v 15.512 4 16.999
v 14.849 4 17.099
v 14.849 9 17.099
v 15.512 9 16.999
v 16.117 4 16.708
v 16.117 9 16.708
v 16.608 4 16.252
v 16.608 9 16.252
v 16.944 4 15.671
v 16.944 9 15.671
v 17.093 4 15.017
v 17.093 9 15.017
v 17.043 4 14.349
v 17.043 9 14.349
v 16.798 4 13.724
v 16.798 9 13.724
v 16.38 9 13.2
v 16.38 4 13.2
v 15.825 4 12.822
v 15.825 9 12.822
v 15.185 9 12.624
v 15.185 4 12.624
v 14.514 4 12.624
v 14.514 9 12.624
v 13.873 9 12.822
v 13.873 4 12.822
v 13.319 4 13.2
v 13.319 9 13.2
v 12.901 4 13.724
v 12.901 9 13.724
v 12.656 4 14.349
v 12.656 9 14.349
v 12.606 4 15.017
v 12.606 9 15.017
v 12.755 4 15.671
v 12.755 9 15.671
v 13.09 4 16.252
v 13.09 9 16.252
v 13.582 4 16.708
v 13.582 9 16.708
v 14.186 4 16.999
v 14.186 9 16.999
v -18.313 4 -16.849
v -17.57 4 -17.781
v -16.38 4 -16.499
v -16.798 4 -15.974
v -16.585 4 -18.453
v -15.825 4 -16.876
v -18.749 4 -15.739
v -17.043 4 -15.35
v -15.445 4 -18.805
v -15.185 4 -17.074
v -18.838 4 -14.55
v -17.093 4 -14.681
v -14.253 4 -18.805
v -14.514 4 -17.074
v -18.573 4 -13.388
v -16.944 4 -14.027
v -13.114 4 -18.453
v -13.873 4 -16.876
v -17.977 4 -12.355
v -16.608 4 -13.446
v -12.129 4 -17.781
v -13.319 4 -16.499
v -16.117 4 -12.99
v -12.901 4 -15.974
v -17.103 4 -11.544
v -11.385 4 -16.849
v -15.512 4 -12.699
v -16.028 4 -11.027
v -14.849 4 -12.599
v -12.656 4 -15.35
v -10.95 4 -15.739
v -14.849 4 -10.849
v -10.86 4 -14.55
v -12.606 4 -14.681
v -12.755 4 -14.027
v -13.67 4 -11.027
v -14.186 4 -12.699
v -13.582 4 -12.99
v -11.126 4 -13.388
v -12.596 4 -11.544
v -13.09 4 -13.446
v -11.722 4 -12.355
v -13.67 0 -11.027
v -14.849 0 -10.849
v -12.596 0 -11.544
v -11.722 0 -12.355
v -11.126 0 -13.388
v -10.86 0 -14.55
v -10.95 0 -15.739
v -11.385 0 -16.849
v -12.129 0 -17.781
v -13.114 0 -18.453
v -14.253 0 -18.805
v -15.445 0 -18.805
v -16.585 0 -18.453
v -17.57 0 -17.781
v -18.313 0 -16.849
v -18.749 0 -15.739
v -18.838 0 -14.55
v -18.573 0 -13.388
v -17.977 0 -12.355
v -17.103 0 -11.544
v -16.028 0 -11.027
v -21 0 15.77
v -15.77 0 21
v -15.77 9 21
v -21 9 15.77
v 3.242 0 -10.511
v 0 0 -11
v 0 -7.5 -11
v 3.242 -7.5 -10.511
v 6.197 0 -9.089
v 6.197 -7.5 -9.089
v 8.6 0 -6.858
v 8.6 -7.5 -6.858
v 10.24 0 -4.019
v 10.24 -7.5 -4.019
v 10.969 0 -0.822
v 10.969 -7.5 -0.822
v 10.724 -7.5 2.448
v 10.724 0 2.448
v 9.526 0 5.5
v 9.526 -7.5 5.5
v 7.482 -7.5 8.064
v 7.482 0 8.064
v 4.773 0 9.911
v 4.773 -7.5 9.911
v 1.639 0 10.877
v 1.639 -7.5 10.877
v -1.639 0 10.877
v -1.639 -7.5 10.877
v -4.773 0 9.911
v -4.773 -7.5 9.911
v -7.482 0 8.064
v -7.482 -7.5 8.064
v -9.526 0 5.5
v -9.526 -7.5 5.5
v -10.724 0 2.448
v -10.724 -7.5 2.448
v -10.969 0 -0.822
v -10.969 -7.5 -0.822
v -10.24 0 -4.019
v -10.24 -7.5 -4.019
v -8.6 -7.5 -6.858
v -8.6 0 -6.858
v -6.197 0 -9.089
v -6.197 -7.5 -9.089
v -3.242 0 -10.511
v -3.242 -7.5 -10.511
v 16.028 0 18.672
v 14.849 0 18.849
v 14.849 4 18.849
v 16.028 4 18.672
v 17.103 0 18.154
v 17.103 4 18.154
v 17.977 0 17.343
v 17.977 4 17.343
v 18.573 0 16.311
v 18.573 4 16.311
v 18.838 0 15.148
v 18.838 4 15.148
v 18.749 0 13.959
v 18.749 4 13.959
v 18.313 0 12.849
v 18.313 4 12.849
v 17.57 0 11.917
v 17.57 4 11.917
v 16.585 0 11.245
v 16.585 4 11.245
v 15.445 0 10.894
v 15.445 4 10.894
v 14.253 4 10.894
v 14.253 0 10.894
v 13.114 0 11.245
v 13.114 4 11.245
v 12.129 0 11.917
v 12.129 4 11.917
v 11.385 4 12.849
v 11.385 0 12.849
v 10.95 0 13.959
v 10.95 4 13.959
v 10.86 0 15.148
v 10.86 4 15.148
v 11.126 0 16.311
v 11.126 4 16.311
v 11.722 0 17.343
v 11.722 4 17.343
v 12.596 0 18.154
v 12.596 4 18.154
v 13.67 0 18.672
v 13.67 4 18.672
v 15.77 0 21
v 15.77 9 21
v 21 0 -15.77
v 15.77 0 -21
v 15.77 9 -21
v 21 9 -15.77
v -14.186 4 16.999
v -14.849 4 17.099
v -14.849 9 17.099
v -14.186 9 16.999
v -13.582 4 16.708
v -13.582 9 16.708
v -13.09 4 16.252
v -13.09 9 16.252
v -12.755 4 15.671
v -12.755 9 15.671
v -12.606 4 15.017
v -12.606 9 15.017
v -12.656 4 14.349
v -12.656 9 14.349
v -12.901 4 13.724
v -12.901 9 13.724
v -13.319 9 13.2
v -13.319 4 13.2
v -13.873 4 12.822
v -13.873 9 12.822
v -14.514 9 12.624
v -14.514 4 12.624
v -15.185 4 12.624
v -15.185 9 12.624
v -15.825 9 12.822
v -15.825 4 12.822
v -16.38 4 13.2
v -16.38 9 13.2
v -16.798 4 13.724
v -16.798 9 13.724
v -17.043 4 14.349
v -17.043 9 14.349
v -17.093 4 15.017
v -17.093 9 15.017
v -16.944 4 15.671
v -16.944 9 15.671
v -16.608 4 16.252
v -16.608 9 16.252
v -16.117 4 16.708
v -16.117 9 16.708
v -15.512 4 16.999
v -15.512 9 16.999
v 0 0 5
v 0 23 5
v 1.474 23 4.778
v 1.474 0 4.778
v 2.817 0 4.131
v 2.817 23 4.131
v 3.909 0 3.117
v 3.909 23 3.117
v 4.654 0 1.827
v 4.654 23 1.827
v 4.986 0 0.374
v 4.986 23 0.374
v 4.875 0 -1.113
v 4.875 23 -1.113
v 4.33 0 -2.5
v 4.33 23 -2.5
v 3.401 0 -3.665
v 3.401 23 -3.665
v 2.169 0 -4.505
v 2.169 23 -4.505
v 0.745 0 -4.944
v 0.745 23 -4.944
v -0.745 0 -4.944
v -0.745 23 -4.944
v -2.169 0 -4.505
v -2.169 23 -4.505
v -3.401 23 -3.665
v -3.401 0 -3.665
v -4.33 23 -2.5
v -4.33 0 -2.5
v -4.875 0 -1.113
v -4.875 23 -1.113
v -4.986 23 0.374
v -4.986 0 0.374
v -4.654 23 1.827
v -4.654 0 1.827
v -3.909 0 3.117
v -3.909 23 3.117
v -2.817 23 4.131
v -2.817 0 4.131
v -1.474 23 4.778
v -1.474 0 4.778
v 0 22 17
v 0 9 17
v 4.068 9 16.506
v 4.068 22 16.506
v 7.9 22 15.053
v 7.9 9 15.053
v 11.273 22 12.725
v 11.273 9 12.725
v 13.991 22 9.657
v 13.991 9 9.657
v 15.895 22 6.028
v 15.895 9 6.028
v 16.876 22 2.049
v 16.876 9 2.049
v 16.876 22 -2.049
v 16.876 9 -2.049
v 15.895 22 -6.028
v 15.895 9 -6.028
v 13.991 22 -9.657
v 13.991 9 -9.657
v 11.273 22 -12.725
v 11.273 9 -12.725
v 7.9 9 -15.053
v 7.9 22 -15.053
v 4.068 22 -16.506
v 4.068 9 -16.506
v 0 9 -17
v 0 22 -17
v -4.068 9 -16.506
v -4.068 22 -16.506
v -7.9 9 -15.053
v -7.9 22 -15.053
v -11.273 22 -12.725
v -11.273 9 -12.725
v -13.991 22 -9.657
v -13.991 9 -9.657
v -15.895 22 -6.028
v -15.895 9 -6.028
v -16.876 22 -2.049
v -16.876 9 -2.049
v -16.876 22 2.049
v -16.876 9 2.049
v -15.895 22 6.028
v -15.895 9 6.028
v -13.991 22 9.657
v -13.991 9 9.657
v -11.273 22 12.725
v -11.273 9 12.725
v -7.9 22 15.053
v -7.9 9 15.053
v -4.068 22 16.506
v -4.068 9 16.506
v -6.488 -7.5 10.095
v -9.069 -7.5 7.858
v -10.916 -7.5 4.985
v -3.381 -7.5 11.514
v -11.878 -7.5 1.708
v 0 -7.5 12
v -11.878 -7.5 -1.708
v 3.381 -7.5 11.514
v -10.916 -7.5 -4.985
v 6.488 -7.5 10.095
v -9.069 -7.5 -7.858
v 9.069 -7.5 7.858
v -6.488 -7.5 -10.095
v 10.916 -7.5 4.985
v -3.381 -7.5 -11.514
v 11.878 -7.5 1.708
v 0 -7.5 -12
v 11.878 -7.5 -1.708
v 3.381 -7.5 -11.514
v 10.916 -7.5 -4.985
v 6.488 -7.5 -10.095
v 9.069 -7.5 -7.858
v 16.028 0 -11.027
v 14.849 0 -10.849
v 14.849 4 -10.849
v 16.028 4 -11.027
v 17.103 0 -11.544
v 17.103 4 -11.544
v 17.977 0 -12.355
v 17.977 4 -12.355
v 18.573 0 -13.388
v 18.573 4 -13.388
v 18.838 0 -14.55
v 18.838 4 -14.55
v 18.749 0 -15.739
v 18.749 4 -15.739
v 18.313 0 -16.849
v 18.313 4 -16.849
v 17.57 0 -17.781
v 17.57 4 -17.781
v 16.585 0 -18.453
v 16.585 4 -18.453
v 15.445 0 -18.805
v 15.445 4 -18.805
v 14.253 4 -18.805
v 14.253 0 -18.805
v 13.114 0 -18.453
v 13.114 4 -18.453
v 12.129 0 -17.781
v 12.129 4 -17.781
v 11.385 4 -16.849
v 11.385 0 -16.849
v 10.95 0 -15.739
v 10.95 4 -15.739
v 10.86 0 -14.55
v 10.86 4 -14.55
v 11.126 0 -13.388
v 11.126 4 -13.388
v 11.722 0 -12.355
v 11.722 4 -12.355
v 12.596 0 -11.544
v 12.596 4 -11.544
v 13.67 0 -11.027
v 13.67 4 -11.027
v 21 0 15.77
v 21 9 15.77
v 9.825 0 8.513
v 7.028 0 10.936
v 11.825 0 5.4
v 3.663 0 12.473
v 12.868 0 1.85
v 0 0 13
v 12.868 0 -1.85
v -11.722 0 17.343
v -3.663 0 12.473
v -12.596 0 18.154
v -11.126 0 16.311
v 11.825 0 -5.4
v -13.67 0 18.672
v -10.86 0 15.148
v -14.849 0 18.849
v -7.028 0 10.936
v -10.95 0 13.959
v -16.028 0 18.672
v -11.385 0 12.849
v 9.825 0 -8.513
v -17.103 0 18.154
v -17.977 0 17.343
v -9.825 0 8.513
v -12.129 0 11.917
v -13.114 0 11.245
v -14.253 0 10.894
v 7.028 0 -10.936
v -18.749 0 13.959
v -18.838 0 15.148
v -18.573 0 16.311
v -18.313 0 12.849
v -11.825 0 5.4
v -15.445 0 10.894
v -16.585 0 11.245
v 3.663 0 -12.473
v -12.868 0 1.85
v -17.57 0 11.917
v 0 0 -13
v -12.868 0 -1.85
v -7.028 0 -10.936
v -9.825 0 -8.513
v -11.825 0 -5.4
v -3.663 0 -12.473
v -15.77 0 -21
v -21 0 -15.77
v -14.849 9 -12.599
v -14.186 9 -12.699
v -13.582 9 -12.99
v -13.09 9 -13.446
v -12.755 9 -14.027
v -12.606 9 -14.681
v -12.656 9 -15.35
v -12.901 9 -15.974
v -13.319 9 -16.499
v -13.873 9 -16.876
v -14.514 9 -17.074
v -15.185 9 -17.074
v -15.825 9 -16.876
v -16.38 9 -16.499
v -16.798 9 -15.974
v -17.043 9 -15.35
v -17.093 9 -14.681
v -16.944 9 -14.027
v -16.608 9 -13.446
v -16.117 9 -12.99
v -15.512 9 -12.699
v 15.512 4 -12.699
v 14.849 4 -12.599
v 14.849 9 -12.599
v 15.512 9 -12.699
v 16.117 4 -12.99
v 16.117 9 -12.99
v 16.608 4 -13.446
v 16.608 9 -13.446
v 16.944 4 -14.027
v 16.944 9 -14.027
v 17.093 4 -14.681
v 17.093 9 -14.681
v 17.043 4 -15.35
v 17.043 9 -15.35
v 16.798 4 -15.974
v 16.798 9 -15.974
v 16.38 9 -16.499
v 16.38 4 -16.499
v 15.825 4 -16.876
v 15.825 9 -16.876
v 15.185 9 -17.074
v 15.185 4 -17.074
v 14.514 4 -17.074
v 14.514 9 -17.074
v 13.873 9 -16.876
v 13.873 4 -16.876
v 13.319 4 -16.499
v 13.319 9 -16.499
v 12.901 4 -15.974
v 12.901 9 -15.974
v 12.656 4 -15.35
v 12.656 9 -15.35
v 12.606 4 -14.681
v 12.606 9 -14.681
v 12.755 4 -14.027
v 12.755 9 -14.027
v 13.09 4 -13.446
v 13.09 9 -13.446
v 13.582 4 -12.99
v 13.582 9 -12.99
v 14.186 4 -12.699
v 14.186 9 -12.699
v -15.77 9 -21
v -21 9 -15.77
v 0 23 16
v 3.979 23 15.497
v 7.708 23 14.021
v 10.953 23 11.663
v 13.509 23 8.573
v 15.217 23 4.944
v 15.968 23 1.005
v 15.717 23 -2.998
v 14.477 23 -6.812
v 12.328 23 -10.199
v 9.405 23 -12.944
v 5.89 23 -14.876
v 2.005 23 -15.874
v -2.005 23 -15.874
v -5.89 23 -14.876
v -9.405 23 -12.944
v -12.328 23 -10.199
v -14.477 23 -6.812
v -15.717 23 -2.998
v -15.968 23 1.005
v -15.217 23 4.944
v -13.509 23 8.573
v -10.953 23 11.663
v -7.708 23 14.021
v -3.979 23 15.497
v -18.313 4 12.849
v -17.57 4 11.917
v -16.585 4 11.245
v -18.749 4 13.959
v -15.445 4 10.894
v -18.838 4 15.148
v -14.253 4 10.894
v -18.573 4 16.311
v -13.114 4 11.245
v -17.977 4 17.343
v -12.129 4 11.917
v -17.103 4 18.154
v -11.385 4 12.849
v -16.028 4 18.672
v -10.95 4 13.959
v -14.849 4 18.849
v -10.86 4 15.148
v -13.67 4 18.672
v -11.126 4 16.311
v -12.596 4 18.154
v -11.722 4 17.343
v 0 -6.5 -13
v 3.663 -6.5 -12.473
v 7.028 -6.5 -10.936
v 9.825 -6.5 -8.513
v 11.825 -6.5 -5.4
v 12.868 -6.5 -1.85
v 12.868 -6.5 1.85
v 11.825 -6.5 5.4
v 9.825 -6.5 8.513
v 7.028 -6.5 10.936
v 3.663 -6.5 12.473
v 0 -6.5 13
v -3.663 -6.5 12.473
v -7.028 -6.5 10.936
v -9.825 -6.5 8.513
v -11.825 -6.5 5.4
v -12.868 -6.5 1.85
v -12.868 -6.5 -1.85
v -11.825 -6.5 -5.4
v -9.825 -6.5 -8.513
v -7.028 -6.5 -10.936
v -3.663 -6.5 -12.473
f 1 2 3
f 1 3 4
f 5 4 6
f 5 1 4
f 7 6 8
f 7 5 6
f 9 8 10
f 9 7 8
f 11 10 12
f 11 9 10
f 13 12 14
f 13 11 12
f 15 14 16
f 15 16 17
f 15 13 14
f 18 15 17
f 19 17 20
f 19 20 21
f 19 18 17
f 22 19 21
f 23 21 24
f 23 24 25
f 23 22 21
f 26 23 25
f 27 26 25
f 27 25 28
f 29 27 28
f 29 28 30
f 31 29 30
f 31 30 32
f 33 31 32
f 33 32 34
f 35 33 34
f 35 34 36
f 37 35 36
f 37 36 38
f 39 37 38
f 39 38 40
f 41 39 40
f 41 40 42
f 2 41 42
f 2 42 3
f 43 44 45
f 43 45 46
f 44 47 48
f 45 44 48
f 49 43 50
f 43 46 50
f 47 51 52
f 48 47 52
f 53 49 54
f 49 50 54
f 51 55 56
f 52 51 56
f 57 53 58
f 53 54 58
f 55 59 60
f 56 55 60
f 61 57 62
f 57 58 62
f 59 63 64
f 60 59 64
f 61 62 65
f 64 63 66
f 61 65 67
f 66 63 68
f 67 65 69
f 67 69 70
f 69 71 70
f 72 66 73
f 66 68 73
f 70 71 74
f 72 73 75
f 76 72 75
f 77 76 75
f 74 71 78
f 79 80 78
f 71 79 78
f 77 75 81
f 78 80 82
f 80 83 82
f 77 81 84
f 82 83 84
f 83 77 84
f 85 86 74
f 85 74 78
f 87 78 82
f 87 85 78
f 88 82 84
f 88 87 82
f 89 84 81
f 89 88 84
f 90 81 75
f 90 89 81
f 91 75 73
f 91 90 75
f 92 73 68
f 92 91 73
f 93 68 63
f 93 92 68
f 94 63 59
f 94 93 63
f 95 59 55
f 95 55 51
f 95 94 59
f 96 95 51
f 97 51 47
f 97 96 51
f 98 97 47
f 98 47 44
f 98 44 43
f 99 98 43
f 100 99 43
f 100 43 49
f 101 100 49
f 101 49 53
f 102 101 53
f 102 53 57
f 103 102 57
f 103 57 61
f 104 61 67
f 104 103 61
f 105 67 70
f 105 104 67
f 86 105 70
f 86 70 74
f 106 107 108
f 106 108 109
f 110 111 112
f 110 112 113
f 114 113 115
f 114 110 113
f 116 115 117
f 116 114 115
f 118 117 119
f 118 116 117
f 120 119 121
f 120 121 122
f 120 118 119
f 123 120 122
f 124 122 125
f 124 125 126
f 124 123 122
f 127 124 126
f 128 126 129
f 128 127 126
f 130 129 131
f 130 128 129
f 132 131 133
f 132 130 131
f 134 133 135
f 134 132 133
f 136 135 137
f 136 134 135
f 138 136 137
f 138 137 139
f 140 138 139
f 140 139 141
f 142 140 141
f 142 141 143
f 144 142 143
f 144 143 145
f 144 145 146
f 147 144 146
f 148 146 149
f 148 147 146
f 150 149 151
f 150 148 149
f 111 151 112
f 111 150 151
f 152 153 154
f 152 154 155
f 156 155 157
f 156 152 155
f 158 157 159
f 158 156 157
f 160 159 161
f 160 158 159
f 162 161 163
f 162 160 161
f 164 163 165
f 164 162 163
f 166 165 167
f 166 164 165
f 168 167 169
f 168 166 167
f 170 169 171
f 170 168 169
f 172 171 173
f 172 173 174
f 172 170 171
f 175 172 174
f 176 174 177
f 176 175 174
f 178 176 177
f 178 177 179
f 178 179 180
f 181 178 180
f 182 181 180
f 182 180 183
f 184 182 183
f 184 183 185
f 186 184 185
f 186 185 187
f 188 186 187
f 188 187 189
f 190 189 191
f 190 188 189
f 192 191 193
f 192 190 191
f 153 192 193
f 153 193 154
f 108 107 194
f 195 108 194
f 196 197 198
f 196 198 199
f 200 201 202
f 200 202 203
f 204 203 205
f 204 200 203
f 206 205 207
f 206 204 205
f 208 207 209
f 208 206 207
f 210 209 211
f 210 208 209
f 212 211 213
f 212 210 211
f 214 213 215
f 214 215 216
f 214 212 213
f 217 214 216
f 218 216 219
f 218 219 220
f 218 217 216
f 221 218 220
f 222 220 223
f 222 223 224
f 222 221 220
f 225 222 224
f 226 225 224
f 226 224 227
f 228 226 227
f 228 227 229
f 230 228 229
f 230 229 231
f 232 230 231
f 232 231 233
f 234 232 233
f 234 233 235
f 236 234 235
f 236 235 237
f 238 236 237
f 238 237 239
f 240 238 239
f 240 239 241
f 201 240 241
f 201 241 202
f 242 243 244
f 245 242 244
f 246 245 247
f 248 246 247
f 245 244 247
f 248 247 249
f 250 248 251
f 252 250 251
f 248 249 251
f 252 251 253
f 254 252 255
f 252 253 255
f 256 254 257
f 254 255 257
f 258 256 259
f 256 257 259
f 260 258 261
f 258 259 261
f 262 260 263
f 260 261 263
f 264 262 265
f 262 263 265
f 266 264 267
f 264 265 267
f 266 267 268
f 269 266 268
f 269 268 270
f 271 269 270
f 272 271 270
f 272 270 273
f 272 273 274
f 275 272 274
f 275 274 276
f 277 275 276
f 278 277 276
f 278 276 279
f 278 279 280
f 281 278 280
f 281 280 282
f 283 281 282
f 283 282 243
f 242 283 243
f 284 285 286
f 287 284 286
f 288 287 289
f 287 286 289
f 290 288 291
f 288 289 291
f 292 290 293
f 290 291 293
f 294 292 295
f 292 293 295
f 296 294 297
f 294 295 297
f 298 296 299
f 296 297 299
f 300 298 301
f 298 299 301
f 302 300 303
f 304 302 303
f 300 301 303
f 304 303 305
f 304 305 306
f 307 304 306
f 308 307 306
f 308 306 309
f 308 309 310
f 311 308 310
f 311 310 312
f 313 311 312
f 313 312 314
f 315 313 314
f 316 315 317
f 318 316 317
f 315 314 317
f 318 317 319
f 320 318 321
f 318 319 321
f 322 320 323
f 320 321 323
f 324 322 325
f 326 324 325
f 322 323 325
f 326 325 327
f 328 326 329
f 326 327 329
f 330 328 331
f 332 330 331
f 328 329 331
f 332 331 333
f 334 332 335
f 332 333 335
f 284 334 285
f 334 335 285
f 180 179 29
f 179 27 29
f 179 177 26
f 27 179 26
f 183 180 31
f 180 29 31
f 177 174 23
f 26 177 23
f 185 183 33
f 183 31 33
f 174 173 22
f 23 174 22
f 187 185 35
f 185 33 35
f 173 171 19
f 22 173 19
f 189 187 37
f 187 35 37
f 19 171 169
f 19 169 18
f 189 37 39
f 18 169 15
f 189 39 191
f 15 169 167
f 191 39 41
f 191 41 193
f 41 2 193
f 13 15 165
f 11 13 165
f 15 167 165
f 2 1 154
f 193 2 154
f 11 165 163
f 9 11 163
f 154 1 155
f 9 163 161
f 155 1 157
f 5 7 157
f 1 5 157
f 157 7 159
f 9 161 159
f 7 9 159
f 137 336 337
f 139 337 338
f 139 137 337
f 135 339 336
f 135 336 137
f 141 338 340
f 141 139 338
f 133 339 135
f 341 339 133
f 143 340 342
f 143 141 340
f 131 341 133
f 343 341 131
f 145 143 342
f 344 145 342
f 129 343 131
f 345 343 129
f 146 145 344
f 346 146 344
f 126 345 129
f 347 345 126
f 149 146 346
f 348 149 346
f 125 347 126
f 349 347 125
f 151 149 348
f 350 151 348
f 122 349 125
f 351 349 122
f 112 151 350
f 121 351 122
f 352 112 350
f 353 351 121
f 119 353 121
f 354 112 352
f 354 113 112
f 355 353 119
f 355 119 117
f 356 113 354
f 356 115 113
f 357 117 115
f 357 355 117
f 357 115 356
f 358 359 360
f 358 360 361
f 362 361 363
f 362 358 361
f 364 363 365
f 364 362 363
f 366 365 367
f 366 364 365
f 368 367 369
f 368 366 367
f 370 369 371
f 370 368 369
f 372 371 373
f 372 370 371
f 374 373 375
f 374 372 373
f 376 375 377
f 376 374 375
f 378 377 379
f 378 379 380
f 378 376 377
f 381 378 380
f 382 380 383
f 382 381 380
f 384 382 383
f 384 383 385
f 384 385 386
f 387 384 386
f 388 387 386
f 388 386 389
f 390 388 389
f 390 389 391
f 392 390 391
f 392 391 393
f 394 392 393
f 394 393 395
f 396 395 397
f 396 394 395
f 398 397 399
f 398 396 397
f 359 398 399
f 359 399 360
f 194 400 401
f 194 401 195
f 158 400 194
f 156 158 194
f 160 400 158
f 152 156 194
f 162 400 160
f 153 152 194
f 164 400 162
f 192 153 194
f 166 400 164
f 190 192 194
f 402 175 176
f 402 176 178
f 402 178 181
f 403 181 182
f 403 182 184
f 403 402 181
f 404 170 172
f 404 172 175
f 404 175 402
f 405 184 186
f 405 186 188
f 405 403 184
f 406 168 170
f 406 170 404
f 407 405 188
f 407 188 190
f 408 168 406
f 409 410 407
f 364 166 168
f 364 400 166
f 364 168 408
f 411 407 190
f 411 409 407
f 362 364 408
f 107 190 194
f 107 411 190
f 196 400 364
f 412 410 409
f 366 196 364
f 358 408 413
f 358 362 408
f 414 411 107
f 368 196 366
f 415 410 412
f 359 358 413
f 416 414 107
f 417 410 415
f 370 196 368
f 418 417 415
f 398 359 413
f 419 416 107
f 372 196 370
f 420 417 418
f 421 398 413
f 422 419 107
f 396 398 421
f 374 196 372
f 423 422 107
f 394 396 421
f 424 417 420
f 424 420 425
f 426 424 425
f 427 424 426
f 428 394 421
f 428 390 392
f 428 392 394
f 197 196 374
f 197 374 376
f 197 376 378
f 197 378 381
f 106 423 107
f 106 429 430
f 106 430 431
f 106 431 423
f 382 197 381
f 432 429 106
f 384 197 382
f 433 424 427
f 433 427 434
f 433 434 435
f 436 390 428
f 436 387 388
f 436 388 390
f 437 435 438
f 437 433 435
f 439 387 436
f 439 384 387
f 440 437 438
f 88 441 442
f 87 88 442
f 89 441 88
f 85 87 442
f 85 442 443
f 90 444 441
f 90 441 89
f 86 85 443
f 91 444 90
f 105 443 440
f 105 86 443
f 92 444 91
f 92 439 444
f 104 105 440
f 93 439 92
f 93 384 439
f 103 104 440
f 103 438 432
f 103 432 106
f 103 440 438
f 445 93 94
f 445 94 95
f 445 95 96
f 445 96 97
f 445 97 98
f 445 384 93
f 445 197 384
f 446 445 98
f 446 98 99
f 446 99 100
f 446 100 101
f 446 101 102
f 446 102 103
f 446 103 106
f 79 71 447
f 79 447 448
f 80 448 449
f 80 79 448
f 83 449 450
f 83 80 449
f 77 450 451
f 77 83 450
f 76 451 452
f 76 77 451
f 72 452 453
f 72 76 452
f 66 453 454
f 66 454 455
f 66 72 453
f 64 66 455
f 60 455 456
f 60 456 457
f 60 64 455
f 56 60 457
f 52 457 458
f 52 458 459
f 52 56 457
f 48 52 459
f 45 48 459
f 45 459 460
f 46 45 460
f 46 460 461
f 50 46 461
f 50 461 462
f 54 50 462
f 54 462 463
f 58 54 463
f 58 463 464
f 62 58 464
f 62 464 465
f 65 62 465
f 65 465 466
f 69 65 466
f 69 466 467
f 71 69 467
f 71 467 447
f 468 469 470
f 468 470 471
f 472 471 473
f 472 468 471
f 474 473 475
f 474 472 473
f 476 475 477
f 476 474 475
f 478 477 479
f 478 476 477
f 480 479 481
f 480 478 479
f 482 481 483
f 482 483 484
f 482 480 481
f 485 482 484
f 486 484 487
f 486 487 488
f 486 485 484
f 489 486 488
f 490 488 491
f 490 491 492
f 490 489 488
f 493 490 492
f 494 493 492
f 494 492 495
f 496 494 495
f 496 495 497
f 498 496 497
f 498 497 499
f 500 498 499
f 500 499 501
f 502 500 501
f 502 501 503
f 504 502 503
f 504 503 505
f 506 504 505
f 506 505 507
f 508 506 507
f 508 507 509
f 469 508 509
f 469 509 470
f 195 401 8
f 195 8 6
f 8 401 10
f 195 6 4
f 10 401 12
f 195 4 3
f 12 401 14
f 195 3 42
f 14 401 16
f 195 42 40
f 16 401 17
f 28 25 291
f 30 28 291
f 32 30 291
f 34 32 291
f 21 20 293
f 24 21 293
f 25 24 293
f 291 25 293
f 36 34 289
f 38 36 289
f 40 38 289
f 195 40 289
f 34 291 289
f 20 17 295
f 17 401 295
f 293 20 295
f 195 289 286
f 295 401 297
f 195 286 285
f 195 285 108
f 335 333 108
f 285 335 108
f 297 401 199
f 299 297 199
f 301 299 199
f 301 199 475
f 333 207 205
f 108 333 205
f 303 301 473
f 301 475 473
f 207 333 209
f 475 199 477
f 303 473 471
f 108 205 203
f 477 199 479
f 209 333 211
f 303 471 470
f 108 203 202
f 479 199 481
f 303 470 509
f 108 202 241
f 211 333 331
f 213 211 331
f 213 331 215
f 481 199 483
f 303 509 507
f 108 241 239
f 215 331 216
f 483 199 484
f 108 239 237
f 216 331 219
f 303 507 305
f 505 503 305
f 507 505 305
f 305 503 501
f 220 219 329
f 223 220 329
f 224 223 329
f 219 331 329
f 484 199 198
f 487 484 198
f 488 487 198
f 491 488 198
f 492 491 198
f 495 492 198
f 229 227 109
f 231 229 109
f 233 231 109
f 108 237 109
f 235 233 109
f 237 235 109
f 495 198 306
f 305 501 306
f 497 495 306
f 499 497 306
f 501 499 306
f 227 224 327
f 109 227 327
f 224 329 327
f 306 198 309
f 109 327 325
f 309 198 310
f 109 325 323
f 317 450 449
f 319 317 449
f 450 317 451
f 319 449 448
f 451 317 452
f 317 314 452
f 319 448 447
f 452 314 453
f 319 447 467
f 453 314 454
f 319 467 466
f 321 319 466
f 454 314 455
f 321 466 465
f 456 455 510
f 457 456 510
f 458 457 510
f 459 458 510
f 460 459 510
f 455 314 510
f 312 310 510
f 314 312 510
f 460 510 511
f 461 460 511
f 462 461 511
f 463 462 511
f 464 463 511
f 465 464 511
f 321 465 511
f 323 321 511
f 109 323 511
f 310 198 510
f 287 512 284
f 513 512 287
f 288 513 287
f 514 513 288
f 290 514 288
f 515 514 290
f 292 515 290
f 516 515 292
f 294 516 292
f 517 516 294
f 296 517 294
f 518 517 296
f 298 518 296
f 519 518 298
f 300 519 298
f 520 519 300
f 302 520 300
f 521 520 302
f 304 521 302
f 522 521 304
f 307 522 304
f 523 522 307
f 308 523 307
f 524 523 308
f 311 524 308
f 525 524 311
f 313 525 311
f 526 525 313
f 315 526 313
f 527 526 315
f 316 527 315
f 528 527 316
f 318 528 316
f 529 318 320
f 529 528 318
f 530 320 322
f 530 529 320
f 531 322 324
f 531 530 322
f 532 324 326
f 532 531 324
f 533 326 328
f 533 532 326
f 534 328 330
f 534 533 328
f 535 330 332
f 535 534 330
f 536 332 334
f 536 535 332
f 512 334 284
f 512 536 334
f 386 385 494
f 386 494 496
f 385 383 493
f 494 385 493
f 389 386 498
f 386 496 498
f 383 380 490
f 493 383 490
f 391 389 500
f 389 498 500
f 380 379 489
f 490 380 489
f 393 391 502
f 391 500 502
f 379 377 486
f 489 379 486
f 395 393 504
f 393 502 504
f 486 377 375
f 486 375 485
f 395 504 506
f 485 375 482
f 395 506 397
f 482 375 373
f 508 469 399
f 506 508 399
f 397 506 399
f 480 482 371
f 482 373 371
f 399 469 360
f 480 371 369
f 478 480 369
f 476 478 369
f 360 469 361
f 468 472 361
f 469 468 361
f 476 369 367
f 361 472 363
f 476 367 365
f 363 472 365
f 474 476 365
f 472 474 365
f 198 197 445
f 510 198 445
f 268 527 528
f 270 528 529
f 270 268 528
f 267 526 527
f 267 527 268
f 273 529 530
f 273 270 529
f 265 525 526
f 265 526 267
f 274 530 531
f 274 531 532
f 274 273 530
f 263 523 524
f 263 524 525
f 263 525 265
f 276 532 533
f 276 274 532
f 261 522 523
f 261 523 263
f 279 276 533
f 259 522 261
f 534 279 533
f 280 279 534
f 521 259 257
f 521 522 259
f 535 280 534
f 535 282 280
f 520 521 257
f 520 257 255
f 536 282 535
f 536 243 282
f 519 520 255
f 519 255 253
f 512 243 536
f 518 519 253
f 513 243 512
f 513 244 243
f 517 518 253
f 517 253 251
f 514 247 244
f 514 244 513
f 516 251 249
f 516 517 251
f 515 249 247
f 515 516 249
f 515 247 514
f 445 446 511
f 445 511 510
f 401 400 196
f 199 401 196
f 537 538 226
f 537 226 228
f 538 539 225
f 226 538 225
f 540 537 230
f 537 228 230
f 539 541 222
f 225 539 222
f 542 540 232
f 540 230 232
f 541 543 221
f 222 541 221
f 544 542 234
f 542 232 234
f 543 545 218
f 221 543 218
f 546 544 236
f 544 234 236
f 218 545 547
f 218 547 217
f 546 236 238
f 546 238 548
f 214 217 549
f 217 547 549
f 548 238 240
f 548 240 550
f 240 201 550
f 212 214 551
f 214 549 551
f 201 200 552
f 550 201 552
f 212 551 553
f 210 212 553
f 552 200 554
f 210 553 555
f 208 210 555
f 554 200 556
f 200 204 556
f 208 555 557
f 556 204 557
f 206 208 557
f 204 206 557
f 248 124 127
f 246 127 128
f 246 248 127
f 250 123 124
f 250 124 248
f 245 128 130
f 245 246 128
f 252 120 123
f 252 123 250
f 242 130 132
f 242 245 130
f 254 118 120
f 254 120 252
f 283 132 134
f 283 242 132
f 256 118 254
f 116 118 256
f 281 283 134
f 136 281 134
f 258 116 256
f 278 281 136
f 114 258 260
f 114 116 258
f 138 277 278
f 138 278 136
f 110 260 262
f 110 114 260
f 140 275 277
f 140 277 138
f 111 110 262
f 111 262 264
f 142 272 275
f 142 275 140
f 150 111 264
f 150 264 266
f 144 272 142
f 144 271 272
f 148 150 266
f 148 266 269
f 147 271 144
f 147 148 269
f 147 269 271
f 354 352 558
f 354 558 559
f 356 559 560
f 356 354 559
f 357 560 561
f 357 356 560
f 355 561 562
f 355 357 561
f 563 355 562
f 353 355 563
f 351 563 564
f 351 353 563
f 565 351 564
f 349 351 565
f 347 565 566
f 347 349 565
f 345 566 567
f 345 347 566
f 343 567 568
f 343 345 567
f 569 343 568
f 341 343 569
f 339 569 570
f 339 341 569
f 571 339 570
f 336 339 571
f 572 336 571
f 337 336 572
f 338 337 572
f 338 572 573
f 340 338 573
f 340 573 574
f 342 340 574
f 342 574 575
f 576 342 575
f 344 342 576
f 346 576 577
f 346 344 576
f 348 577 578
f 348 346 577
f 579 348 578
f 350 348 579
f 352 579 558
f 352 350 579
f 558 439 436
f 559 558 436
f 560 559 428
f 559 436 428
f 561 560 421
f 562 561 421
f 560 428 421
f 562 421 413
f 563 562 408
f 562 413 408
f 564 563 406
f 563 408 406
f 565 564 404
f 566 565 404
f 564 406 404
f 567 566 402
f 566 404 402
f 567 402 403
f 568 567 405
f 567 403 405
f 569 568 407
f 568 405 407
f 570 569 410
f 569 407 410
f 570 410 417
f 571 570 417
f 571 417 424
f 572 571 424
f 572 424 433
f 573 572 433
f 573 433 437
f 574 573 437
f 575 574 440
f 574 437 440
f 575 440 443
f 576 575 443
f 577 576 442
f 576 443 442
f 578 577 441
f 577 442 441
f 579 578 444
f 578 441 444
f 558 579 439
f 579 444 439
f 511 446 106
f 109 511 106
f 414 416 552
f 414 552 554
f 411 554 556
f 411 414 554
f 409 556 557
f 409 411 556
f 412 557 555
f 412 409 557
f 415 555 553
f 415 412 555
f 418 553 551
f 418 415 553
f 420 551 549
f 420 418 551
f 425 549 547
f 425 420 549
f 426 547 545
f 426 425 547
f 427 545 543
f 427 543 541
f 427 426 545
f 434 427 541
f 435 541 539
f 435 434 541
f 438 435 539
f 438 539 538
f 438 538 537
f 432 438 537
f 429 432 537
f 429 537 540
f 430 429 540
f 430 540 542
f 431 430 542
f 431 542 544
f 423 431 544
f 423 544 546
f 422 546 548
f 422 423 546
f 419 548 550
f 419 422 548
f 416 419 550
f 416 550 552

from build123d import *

# Parameters (mm, degrees)
SKETCH_1_R          = 2.25
EXTRUDE_1_DEPTH     = 9
SKETCH_2_R          = 4
CUT_EXTRUDE_1_DEPTH = 4
SKETCH_3_R          = 17
EXTRUDE_2_DEPTH     = 14
SKETCH_4_R          = 13
SKETCH_4_R_2        = 11
EXTRUDE_3_DEPTH     = 7.5
CUT_EXTRUDE_2_REACH = 44.571
SKETCH_5_R          = 5
CHAMFER_1_SIZE      = 1


with BuildPart() as part:
    # 草图1 → 凸台-拉伸1 (new body)
    with BuildSketch(Plane(origin=(0, 0, 0), x_dir=(1, 0, 0), z_dir=(0, 1, 0))):
        Polygon((0, 21), (15.769552622, 21), (21, 15.769552622), (21, 0), (21, -15.769552622), (15.769552622, -21), (0, -21), (-15.769552622, -21), (-21, -15.769552622), (-21, 0), (-21, 15.769552622), (-15.769552622, 21), align=None)
        with Locations(Location((14.849242405, 14.849242405, 0), (0, 0, 270))):
            Circle(SKETCH_1_R, mode=Mode.SUBTRACT)
        with Locations(Location((14.849242405, -14.849242405, 0), (0, 0, 270))):
            Circle(SKETCH_1_R, mode=Mode.SUBTRACT)
        with Locations(Location((-14.849242405, -14.849242405, 0), (0, 0, 270))):
            Circle(SKETCH_1_R, mode=Mode.SUBTRACT)
        with Locations(Location((-14.849242405, 14.849242405, 0), (0, 0, 270))):
            Circle(SKETCH_1_R, mode=Mode.SUBTRACT)
    extrude(amount=EXTRUDE_1_DEPTH)

    # 草图2 → 切除-拉伸1 (cut)
    with BuildSketch(Plane(origin=(0, 0, 0), x_dir=(1, 0, 0), z_dir=(0, 1, 0))):
        with Locations(Location((-14.849242405, 14.849242405, 0), (0, 0, 270))):
            Circle(SKETCH_2_R)
        with Locations(Location((14.849242405, 14.849242405, 0), (0, 0, 270))):
            Circle(SKETCH_2_R)
        with Locations(Location((14.849242405, -14.849242405, 0), (0, 0, 270))):
            Circle(SKETCH_2_R)
        with Locations(Location((-14.849242405, -14.849242405, 0), (0, 0, 270))):
            Circle(SKETCH_2_R)
    extrude(amount=CUT_EXTRUDE_1_DEPTH, mode=Mode.SUBTRACT)

    # 草图3 → 凸台-拉伸2 (add)
    with BuildSketch(Plane(origin=(0, 9, 0), x_dir=(1, 0, 0), z_dir=(0, 1, 0))):
        with Locations(Location((0, 0, 0), (0, 0, 270))):
            Circle(SKETCH_3_R)
    extrude(amount=EXTRUDE_2_DEPTH)

    # 草图4 → 凸台-拉伸3 (add)
    with BuildSketch(Plane.XZ):
        with Locations(Location((0, 0, 0), (0, 0, 270))):
            Circle(SKETCH_4_R)
        with Locations(Location((0, 0, 0), (0, 0, 270))):
            Circle(SKETCH_4_R_2, mode=Mode.SUBTRACT)
    extrude(amount=EXTRUDE_3_DEPTH)

    # 草图5 → 切除-拉伸2 (cut, up to next)
    with BuildSketch(Plane(origin=(0, 23, 0), x_dir=(1, 0, 0), z_dir=(0, 1, 0)), mode=Mode.PRIVATE) as cut_extrude_2_sk1:
        with Locations(Location((0, 0, 0), (0, 0, 270))):
            Circle(SKETCH_5_R)
    cut_extrude_2_tool1 = extrude(cut_extrude_2_sk1.sketch, amount=-CUT_EXTRUDE_2_REACH, mode=Mode.PRIVATE) & part.part
    add(cut_extrude_2_tool1.solids().sort_by_distance((0, 23, 0))[0], mode=Mode.SUBTRACT)

    # 倒角1
    chamfer_1_edges = [part.edges().sort_by_distance(p)[0] for p in [
        (0, 23, -17),
        (0, -7.5, 13),
    ]]
    chamfer(chamfer_1_edges, length=CHAMFER_1_SIZE)


solid = part.part
